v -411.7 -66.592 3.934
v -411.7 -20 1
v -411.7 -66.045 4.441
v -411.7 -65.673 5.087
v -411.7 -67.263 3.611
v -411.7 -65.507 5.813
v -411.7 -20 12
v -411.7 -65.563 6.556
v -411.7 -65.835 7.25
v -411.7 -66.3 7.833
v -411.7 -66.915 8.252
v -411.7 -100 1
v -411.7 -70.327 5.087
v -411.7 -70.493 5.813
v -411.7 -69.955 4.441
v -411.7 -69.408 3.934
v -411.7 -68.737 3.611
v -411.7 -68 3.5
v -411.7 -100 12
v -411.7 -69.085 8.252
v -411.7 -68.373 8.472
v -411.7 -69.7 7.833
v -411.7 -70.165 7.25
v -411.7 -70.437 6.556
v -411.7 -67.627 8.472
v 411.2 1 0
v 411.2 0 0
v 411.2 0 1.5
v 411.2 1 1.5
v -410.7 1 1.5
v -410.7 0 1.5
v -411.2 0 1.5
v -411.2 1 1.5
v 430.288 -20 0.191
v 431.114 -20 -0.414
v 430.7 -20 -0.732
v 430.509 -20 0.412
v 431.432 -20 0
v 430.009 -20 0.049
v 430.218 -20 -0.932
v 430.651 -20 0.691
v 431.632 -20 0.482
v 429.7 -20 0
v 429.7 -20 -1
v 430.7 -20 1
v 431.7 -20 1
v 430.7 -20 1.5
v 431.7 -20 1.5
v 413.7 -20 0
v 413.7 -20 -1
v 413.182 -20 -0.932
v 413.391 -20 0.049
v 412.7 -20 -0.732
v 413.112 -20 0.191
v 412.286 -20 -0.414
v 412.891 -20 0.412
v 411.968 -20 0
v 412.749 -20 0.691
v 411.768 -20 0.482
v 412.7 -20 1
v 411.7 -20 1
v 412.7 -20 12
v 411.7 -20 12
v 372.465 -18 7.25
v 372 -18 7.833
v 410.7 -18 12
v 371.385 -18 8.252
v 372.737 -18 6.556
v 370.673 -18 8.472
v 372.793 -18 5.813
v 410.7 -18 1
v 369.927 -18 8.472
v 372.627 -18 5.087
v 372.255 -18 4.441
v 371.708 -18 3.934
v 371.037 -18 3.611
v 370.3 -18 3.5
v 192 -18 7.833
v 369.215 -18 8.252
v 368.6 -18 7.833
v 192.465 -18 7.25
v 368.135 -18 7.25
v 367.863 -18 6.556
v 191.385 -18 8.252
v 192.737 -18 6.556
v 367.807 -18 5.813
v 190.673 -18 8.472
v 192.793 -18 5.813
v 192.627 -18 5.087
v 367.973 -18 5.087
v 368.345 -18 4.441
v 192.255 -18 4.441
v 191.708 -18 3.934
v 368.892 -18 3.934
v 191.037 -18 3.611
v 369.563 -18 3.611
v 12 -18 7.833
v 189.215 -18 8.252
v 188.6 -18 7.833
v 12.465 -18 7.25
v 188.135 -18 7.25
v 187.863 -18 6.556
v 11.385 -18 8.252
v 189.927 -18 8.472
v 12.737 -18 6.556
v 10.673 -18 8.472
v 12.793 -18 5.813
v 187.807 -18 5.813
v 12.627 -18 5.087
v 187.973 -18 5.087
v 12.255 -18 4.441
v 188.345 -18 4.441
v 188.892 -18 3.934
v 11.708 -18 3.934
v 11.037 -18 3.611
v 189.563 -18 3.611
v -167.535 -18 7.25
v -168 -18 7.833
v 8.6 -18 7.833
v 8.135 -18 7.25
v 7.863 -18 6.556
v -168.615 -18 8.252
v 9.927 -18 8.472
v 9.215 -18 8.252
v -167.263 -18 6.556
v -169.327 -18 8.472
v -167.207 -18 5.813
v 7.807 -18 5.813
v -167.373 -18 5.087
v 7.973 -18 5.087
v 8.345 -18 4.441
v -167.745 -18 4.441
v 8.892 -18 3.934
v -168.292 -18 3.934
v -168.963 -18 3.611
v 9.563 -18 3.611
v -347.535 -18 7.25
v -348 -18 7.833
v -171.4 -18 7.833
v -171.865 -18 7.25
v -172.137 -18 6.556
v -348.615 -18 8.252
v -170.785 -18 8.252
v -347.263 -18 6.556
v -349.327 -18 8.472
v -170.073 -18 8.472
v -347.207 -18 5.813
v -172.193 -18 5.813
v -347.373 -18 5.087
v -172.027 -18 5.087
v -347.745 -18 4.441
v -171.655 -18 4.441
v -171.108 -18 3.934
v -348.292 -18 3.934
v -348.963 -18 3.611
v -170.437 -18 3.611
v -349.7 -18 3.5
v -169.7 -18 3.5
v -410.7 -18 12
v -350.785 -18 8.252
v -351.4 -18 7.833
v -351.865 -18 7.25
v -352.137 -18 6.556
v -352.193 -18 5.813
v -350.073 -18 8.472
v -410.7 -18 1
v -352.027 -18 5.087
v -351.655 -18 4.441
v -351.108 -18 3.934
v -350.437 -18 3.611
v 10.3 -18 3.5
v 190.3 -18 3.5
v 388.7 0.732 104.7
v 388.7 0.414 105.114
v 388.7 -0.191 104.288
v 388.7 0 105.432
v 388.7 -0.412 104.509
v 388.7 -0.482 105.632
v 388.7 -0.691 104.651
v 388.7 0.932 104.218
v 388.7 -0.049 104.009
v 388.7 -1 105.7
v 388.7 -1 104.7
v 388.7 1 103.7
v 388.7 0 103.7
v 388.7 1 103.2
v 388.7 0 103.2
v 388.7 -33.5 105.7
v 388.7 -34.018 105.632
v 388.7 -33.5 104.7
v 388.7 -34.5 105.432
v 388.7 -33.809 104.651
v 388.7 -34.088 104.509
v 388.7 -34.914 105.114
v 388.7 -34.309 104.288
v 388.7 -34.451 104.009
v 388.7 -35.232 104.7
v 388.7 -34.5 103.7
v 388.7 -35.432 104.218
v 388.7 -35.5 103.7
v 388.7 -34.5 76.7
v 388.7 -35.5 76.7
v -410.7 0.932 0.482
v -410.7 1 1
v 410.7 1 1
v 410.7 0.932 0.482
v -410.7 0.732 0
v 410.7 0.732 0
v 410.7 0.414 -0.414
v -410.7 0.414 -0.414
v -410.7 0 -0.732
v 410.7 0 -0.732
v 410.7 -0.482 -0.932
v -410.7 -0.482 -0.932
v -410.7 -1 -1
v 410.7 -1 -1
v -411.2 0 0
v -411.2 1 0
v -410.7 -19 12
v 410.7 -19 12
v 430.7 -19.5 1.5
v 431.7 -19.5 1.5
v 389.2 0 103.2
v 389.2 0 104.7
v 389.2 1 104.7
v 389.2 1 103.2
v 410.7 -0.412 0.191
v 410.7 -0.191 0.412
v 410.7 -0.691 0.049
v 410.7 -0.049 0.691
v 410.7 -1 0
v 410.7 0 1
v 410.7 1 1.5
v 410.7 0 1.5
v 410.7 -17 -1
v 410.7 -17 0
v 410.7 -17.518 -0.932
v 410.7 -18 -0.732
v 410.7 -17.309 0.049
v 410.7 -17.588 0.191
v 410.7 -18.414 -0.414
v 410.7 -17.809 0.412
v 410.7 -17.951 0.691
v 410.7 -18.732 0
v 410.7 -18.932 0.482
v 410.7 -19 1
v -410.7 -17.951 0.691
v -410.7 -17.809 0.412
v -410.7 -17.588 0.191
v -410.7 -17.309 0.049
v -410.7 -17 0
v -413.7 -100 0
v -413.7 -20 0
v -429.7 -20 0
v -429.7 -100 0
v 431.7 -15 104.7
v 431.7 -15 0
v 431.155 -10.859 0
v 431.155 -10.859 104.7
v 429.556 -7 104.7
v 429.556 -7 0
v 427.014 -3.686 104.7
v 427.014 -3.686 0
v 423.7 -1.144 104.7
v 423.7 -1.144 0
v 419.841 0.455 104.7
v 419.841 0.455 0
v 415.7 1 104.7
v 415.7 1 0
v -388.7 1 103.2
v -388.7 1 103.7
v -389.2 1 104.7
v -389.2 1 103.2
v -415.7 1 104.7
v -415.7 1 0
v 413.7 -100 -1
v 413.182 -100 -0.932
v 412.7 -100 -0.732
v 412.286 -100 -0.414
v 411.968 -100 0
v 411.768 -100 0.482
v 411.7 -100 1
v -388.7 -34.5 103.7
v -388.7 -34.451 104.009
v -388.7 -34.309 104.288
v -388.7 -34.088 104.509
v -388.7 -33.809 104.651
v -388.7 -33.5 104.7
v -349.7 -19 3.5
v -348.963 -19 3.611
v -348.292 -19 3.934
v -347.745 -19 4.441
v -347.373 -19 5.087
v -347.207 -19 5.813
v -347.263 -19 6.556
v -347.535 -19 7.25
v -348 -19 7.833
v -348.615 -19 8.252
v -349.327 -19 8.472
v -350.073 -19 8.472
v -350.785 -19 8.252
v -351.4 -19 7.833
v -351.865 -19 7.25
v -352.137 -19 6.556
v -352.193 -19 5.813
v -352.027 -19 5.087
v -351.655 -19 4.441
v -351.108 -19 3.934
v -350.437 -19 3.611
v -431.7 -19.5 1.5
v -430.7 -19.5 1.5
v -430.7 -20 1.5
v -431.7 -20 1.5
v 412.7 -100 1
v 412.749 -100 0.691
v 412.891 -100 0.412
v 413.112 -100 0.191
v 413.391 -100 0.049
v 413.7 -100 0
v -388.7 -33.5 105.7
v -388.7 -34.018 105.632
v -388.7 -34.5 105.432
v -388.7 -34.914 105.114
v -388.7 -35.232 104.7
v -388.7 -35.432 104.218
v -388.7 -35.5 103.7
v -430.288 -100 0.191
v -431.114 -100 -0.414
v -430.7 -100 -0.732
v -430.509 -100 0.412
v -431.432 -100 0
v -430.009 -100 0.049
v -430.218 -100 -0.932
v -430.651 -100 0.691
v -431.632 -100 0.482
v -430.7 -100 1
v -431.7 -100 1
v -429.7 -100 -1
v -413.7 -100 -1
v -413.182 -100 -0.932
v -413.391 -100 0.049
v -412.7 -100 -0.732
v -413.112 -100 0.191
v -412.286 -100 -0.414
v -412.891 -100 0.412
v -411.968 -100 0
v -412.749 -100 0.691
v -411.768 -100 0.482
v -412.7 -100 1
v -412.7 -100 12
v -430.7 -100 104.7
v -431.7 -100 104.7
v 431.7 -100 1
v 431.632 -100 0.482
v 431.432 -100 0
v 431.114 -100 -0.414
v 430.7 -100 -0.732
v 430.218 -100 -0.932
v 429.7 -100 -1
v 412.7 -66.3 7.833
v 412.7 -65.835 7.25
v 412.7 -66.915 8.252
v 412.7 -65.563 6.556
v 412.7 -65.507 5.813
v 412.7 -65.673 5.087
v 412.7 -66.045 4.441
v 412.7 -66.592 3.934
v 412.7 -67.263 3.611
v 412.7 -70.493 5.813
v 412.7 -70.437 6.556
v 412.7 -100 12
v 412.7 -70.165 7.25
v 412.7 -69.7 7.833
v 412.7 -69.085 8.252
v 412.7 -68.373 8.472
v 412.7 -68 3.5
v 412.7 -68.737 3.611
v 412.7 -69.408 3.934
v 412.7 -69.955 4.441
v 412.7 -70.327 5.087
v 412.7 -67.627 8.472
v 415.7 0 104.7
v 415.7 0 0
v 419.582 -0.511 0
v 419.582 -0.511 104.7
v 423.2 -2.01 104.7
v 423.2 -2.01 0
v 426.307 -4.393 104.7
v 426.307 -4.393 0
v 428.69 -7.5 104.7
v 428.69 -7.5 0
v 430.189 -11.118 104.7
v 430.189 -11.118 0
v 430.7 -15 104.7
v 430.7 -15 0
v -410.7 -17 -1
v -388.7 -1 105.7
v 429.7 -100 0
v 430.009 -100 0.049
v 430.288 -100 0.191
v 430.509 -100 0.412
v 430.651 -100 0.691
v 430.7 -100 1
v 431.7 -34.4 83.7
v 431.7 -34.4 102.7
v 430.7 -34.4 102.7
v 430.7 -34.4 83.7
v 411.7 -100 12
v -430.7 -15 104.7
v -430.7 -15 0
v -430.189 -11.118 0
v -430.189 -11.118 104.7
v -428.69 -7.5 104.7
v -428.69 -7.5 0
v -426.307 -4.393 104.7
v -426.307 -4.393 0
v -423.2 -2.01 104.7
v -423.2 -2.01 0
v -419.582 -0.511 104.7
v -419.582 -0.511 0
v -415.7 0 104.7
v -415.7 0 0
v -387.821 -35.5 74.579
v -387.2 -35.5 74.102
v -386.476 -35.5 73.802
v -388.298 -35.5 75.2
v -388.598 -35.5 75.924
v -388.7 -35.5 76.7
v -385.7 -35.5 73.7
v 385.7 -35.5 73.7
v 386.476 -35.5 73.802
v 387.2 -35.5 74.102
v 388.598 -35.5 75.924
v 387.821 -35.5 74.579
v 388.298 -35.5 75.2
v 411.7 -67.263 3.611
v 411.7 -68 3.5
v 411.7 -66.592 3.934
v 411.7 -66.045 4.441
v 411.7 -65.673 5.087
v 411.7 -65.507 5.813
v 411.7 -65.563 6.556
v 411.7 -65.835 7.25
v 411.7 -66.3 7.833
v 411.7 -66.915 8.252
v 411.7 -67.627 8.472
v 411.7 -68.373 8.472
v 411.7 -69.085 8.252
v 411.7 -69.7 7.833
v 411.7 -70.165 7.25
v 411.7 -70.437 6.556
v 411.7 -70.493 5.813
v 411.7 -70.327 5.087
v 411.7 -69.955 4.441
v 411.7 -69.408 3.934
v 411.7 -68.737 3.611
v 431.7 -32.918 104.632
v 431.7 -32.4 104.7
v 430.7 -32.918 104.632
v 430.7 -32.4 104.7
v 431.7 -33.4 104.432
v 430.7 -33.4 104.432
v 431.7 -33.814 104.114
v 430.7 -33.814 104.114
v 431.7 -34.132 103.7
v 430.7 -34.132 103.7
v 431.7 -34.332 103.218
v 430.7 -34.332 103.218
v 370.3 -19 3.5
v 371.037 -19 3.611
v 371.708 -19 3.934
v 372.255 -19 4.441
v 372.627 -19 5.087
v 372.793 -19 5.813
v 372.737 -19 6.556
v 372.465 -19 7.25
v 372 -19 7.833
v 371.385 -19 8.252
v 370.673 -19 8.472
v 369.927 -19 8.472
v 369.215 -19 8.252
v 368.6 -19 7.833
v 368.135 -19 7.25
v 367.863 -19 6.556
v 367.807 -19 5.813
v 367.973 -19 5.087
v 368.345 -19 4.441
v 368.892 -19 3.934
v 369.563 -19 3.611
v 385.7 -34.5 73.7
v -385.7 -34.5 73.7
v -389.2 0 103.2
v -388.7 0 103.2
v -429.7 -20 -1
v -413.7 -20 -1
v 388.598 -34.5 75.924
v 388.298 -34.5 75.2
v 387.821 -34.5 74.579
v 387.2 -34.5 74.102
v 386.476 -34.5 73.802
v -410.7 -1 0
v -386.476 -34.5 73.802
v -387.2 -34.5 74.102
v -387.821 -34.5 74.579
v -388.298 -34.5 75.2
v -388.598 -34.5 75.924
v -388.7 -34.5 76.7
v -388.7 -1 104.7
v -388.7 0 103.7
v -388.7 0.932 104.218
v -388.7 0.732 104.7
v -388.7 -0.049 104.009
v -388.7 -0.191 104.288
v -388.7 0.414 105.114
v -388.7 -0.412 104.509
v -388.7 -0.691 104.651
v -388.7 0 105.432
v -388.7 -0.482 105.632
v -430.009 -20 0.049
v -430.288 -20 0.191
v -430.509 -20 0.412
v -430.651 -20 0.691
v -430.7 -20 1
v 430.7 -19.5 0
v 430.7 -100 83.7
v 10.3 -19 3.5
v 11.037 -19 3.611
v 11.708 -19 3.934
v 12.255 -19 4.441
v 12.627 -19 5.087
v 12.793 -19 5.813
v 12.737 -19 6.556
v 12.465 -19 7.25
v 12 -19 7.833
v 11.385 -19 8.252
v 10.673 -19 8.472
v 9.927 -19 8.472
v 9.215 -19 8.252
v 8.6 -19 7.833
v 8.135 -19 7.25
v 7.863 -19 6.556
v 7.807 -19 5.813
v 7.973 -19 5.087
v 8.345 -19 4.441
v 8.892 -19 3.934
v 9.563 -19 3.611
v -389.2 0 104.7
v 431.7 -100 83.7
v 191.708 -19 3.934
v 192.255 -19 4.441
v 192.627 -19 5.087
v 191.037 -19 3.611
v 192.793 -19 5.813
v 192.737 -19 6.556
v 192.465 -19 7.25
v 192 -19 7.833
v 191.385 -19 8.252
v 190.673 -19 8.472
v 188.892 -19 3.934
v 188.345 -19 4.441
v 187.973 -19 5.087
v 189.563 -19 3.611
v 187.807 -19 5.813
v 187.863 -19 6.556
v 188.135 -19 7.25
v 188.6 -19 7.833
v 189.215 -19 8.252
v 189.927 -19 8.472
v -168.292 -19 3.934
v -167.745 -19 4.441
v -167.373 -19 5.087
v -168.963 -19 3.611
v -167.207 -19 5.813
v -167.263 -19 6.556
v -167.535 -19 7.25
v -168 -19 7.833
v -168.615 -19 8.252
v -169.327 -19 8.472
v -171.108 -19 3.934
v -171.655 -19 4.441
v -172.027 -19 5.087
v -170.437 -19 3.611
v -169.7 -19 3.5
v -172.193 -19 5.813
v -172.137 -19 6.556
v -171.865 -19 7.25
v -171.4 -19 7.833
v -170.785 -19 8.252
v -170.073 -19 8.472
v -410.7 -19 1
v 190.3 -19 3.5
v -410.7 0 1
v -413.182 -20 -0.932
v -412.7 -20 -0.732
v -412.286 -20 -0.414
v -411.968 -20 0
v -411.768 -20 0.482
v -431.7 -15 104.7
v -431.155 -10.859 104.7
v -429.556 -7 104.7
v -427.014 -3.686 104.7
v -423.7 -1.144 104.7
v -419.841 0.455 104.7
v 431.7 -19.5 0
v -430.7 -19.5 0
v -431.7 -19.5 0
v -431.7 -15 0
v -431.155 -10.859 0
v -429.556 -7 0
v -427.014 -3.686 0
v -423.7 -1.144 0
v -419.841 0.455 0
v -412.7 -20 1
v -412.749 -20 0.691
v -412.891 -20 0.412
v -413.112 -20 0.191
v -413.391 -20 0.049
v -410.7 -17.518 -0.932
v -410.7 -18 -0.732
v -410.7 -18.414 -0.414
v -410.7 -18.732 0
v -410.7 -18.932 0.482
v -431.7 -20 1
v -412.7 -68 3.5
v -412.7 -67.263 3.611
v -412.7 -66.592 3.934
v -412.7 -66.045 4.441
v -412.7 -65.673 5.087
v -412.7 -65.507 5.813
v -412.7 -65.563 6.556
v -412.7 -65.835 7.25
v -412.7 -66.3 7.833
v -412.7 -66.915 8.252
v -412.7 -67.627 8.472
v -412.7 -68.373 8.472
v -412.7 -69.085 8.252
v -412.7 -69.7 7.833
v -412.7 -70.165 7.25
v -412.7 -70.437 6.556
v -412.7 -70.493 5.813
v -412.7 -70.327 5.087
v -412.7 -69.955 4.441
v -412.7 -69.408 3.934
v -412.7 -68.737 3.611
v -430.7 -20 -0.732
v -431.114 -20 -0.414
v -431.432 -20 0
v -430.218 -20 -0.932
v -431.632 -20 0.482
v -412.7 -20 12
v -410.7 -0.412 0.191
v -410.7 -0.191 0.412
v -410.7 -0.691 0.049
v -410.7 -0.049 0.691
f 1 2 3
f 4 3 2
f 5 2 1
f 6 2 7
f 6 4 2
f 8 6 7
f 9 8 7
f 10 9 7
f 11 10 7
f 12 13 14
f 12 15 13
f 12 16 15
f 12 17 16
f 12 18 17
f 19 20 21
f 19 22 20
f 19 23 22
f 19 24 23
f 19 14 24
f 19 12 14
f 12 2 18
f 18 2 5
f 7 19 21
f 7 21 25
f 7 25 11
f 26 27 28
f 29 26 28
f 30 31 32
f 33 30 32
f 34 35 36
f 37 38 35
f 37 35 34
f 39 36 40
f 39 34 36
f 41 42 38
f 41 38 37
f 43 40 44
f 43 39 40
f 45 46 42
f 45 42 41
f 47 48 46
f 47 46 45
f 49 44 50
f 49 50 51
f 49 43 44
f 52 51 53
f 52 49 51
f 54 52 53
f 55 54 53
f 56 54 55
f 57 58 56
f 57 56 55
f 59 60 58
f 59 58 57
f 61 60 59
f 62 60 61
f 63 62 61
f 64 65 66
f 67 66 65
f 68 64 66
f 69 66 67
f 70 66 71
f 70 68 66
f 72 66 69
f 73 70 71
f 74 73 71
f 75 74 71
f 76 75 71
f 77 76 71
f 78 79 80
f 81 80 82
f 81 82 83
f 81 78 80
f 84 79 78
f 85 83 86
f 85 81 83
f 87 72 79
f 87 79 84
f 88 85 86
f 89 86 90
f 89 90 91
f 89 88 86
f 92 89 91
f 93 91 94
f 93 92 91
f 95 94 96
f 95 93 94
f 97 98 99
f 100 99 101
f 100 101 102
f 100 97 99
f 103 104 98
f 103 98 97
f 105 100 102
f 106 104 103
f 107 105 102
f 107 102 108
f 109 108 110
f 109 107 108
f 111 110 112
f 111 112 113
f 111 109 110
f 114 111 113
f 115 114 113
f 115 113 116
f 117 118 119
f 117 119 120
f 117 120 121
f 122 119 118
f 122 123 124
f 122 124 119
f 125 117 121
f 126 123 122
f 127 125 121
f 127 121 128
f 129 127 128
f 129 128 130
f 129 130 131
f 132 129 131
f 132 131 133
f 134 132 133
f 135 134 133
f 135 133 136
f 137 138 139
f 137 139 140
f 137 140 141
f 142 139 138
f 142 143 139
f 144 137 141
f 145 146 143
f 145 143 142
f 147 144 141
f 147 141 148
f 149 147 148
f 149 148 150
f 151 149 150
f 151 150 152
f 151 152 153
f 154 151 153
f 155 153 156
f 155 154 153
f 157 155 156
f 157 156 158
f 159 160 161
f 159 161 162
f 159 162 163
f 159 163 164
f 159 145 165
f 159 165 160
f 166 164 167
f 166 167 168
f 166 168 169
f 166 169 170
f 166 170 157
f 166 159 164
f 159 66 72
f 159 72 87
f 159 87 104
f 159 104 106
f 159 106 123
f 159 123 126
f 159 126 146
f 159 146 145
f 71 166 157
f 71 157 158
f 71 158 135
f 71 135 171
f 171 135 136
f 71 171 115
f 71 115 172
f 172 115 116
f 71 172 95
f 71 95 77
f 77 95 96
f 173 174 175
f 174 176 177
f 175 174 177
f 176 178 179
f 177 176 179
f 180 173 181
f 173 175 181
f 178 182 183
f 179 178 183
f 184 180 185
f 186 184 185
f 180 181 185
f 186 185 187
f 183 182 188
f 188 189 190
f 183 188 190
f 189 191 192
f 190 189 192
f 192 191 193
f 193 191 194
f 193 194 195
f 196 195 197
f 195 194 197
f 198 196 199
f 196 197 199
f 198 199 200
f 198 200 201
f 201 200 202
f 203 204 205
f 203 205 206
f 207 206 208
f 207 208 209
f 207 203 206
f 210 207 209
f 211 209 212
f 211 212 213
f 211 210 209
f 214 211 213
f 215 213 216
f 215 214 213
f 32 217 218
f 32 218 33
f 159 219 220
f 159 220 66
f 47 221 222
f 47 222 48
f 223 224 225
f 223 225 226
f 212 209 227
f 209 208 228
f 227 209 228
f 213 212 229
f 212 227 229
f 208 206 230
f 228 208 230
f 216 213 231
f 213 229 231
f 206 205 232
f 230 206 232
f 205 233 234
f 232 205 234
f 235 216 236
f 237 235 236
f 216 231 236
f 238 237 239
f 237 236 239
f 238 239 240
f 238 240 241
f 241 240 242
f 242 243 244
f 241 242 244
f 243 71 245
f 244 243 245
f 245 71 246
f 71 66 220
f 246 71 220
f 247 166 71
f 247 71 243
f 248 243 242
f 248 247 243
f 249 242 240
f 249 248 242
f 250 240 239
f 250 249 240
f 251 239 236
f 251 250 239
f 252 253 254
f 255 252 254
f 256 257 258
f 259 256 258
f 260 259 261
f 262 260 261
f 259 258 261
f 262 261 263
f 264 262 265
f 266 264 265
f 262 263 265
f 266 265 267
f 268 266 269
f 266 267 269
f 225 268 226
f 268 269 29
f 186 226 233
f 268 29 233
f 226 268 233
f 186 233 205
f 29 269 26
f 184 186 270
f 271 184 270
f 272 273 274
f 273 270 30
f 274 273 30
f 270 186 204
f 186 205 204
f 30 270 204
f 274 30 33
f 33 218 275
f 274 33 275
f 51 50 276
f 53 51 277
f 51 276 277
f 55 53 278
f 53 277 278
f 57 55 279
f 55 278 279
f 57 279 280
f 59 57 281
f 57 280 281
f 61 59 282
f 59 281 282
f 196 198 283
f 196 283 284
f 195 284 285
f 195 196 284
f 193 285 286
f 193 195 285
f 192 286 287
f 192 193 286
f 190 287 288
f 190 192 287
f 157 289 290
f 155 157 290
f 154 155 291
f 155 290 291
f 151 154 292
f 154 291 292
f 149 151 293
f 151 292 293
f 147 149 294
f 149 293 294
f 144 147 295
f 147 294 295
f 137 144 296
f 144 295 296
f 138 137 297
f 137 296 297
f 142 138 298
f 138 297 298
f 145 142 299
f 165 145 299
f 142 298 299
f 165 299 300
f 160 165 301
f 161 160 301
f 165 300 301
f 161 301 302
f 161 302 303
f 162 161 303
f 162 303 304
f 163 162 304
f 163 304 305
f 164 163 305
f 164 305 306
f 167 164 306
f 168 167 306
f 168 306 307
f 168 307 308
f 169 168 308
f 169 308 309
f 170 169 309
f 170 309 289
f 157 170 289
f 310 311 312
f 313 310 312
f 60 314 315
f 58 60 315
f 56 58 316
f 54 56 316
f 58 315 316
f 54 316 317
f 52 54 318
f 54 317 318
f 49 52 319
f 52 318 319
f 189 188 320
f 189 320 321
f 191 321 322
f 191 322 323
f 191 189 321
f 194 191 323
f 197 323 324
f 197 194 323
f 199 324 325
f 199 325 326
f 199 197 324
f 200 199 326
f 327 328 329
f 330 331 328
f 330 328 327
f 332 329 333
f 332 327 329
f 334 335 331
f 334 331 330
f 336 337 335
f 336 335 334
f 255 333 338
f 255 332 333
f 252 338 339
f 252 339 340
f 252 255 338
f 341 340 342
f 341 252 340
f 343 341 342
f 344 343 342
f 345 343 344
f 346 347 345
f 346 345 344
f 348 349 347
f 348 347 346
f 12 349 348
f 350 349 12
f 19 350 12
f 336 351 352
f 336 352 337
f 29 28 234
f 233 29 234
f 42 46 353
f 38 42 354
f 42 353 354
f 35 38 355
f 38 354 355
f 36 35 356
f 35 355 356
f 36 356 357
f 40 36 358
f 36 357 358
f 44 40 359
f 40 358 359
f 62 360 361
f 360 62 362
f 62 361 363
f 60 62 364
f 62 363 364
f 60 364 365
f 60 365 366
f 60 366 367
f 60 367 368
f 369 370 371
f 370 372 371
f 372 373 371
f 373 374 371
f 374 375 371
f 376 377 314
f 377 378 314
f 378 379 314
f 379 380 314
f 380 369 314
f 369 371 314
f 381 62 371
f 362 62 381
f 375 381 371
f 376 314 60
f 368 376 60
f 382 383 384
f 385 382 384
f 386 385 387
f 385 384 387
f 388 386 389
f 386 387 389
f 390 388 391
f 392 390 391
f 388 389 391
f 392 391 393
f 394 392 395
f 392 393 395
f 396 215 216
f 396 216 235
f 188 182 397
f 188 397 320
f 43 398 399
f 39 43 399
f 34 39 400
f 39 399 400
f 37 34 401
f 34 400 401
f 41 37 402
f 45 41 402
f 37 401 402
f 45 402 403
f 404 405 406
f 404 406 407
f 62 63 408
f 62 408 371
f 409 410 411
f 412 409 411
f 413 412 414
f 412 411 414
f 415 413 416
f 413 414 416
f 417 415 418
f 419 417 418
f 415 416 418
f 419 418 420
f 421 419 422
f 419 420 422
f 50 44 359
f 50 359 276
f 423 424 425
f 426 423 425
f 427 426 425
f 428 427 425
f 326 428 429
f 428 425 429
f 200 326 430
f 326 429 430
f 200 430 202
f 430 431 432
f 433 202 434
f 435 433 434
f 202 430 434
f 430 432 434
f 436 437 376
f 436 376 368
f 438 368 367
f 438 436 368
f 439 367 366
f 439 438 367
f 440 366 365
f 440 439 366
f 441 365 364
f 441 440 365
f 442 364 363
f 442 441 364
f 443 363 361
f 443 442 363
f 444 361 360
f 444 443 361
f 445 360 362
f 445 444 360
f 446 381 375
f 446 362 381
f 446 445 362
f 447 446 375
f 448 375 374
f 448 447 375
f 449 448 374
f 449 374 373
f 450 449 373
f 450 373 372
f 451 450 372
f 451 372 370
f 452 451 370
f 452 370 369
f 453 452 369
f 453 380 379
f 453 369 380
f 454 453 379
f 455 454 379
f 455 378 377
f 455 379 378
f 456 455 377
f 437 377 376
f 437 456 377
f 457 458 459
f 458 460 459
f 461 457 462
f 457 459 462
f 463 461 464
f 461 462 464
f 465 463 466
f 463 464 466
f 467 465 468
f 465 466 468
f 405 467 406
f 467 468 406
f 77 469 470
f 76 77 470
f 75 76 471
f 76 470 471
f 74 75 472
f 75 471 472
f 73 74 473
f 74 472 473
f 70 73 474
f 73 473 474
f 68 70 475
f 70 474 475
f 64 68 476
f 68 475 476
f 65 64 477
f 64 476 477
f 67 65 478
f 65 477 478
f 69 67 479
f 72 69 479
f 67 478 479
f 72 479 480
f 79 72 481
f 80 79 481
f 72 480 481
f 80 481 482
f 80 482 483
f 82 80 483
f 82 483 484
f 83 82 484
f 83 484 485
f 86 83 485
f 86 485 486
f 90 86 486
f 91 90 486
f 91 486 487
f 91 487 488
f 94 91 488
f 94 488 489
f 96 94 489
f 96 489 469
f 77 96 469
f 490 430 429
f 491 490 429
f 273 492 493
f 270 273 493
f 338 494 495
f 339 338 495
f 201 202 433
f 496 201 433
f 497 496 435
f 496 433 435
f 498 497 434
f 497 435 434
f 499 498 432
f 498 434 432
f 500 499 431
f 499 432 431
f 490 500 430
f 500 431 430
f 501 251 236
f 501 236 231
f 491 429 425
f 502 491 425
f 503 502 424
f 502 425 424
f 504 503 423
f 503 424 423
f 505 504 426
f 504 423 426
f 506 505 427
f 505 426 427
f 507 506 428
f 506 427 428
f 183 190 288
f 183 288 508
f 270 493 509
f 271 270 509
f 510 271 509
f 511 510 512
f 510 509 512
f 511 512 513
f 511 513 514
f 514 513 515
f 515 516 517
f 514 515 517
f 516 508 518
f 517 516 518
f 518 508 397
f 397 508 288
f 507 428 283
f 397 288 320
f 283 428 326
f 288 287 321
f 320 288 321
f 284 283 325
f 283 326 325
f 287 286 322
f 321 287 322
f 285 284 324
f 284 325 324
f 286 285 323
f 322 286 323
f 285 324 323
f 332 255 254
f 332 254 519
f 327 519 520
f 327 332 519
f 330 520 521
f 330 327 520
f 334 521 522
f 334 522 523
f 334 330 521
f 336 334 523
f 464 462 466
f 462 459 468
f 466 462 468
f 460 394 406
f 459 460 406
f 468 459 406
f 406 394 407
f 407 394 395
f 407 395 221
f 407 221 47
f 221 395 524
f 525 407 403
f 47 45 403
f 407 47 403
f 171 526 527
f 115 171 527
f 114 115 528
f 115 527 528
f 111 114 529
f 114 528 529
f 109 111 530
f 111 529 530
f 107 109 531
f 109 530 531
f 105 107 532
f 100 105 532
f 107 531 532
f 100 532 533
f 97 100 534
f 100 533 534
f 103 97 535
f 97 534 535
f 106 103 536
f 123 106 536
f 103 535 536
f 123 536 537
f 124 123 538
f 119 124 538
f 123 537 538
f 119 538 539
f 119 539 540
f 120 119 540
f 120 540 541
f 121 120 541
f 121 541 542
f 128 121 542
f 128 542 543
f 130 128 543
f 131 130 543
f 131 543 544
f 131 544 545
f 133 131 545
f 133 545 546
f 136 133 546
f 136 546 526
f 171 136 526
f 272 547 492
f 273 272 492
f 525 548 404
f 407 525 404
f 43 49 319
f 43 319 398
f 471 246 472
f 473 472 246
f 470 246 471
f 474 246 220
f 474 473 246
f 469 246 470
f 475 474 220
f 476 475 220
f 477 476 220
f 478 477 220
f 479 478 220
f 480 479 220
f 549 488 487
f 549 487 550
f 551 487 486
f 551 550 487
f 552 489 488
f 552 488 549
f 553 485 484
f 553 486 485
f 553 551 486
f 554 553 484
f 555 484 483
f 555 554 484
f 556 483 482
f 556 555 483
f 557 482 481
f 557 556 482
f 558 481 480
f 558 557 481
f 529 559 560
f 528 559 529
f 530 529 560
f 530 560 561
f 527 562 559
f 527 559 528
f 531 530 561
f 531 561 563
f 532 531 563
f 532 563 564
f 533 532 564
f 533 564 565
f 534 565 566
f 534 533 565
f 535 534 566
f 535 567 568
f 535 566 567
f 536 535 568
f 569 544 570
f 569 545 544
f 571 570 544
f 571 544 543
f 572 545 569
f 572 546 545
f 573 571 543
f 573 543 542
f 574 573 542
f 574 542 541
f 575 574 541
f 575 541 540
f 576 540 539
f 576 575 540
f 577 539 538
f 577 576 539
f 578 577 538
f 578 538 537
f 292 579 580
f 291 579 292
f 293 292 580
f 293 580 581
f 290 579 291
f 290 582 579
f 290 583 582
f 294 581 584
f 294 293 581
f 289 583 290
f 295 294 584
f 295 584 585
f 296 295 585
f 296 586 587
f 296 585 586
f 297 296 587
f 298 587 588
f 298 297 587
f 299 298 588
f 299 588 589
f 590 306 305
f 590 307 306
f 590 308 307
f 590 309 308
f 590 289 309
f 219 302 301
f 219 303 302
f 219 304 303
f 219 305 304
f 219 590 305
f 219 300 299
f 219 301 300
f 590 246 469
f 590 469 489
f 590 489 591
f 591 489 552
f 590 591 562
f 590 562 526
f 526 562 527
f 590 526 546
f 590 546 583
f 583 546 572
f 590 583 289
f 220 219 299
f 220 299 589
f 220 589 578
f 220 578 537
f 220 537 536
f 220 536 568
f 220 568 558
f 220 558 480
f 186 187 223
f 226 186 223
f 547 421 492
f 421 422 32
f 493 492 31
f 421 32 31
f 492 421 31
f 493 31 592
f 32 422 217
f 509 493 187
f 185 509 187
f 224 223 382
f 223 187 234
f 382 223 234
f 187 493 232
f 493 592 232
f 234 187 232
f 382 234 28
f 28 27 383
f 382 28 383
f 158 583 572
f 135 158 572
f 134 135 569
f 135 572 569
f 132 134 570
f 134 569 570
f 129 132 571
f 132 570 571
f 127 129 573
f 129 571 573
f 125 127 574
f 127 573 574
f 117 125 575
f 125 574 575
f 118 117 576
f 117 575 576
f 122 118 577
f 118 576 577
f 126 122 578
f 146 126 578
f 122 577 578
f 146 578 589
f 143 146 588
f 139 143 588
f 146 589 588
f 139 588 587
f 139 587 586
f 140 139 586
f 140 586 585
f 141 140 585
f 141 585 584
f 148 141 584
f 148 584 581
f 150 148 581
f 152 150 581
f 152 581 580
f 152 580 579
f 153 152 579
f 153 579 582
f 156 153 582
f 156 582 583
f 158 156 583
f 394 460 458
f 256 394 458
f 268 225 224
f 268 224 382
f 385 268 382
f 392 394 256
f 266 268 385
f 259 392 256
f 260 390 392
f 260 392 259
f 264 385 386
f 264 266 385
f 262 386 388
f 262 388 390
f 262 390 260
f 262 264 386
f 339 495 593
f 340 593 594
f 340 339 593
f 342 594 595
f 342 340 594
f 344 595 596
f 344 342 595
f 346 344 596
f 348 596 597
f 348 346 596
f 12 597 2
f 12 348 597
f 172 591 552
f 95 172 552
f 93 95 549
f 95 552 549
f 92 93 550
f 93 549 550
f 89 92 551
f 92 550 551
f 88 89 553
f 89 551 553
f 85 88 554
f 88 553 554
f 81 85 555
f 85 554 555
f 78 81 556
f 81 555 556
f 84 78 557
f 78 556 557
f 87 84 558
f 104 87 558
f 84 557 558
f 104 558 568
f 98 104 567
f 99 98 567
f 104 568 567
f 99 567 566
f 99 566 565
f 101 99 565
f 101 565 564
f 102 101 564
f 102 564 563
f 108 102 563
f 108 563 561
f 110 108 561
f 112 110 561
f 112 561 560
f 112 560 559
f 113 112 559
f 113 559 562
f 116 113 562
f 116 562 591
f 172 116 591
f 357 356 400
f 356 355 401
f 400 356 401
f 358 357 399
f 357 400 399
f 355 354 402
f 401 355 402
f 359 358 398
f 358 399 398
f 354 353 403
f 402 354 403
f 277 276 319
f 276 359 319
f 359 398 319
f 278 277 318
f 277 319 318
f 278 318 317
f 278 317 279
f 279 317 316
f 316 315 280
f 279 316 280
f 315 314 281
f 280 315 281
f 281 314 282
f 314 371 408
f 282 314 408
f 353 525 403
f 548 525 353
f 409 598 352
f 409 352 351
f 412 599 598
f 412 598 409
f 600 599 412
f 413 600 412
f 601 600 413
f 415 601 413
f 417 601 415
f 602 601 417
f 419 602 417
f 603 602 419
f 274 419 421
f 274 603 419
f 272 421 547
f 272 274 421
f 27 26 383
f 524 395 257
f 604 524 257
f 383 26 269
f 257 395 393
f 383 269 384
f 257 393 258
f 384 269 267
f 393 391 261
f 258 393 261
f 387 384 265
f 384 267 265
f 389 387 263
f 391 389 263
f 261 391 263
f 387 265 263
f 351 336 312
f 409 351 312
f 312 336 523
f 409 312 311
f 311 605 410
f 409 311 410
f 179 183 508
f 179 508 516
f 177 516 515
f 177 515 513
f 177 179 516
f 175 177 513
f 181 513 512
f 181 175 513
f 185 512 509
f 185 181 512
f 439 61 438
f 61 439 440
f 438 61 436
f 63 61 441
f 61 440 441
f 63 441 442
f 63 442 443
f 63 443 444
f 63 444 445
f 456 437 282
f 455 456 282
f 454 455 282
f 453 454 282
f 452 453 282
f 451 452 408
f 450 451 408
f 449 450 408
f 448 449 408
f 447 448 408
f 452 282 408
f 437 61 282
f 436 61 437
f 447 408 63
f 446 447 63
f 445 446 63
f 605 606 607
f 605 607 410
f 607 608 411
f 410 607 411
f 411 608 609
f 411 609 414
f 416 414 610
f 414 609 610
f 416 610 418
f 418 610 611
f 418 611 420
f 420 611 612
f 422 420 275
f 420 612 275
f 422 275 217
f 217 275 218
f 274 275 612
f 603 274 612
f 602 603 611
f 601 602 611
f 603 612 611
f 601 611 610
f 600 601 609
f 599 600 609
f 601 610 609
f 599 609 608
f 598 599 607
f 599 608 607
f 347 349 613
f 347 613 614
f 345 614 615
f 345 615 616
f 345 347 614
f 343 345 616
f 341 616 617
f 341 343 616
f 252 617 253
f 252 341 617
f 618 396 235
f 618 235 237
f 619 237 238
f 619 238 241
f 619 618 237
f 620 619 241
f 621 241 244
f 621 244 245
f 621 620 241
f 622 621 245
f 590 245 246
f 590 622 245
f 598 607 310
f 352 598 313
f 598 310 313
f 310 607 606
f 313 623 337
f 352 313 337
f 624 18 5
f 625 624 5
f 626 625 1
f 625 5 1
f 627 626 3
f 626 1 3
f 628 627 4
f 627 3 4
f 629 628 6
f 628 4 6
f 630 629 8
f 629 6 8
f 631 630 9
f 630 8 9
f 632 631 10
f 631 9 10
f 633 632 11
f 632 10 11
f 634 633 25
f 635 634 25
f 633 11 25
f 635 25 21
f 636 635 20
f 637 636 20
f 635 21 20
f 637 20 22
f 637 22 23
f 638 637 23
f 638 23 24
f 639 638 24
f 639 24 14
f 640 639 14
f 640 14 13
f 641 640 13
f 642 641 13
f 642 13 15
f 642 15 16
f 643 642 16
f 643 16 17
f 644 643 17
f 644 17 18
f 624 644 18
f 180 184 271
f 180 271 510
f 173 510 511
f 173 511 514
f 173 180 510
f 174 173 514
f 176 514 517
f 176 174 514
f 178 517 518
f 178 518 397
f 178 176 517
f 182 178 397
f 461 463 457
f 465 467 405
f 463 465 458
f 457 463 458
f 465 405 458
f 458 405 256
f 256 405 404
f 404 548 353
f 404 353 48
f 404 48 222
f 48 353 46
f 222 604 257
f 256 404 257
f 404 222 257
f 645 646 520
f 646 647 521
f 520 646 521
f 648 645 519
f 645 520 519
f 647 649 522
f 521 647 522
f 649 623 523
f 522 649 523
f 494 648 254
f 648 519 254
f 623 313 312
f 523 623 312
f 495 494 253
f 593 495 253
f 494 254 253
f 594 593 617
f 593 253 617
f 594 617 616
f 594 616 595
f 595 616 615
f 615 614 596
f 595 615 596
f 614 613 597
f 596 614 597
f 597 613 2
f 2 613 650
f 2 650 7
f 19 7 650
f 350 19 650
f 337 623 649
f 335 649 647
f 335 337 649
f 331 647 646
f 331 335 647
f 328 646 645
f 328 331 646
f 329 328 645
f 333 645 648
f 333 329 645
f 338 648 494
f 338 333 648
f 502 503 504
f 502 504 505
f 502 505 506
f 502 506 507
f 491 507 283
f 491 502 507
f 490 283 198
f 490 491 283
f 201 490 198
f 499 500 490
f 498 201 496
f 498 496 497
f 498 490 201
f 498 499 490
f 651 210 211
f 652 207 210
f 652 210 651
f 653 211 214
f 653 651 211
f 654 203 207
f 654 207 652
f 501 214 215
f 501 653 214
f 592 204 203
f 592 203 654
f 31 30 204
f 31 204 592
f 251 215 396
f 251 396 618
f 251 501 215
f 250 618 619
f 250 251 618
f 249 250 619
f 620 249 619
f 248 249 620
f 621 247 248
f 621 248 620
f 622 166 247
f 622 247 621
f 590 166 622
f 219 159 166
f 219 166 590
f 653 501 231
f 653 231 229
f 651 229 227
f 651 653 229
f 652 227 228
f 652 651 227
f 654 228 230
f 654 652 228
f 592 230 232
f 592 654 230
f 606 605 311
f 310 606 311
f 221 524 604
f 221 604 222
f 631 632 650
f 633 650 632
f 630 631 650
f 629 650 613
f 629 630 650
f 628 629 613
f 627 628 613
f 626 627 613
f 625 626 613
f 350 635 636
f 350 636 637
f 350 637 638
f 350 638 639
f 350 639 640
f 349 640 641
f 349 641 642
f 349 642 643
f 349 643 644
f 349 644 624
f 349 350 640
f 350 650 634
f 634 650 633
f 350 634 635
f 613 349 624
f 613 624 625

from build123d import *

# Parameters (mm, degrees)
BASE_FLANGE1_DEPTH             = 104.7
EDGE_FLANGE1_STRIP_W           = 6
EDGE_FLANGE1_STRIP_H           = 1
EDGE_FLANGE1_STRIP_CUT_DEPTH   = 821.4
EDGE_FLANGE1_RELIEF_W          = 6.5
EDGE_FLANGE1_RELIEF_H          = 0.5
EDGE_FLANGE1_RELIEF_CUT_DEPTH  = 1
EDGE_FLANGE1_DEPTH             = 821.4
EDGE_FLANGE2_STRIP_W           = 6
EDGE_FLANGE2_STRIP_H           = 1
EDGE_FLANGE2_STRIP_CUT_DEPTH   = 821.4
EDGE_FLANGE2_DEPTH             = 821.4
EDGE_FLANGE3_STRIP_W           = 6
EDGE_FLANGE3_STRIP_H           = 1
EDGE_FLANGE3_STRIP_CUT_DEPTH   = 80
EDGE_FLANGE3_RELIEF_W          = 6.5
EDGE_FLANGE3_RELIEF_H          = 0.5
EDGE_FLANGE3_RELIEF_CUT_DEPTH  = 1
EDGE_FLANGE3_DEPTH             = 80
EDGE_FLANGE4_STRIP_W           = 6
EDGE_FLANGE4_STRIP_H           = 1
EDGE_FLANGE4_STRIP_CUT_DEPTH   = 80
EDGE_FLANGE4_DEPTH             = 80
EDGE_FLANGE5_STRIP_W           = 6
EDGE_FLANGE5_STRIP_H           = 1
EDGE_FLANGE5_STRIP_CUT_DEPTH   = 777.4
EDGE_FLANGE5_RELIEF_W          = 6.5
EDGE_FLANGE5_RELIEF_H          = 0.5
EDGE_FLANGE5_RELIEF_CUT_DEPTH  = 1
EDGE_FLANGE5_DEPTH             = 777.4
SKETCH25_R                     = 2.5
CUT_EXTRUDE1_DEPTH             = 3
SKETCH26_R                     = 2.5
CUT_EXTRUDE2_DEPTH             = 3
CUT_EXTRUDE2_DIRECTION_2_REACH = 857.86
EDGE_FLANGE7_STRIP_W           = 6
EDGE_FLANGE7_STRIP_H           = 1
EDGE_FLANGE7_STRIP_CUT_DEPTH   = 777.4
EDGE_FLANGE7_DEPTH             = 777.4
EDGE_FLANGE7_FLAT_DEPTH        = 1
SKETCH30_W                     = 21
SKETCH30_H                     = 65.6
CUT_EXTRUDE3_DEPTH             = 10
FILLET1_R                      = 2


# Sheet-metal steps are written as plain solids
with BuildPart() as part:
    # Sketch1 → Base-Flange1 (new body)
    with BuildSketch(Plane.XY):
        with BuildLine():
            Line((-430.7, -100), (-430.7, -15))
            ThreePointArc((-430.7, -15), (-426.306601718, -4.393398282), (-415.7, 0))
            Line((-415.7, 0), (415.7, 0))
            ThreePointArc((415.7, 0), (426.306601718, -4.393398282), (430.7, -15))
            Line((430.7, -15), (430.7, -100))
            Line((430.7, -100), (431.7, -100))
            Line((431.7, -100), (431.7, -15))
            ThreePointArc((431.7, -15), (427.013708499, -3.686291501), (415.7, 1))
            Line((415.7, 1), (-415.7, 1))
            ThreePointArc((-415.7, 1), (-427.013708499, -3.686291501), (-431.7, -15))
            Line((-431.7, -15), (-431.7, -100))
            Line((-431.7, -100), (-430.7, -100))
        make_face()
    extrude(amount=BASE_FLANGE1_DEPTH)

    # Edge-Flange1 strip (across the edge) → Edge-Flange1 strip cut (cut)
    with BuildSketch(Plane(origin=(-410.7, 0, 0), x_dir=(0, 0, 1), z_dir=(1, 0, 0))):
        with Locations((-2, -0.5)):
            Rectangle(EDGE_FLANGE1_STRIP_W, EDGE_FLANGE1_STRIP_H)
    extrude(amount=EDGE_FLANGE1_STRIP_CUT_DEPTH, mode=Mode.SUBTRACT)

    # Edge-Flange1 relief (on the sheet) → Edge-Flange1 relief cut (cut)
    with BuildSketch(Plane(origin=(-410.7, 0, 1), x_dir=(0, 0, 1), z_dir=(0, -1, 0))):
        with Locations((-2.75, 0.25)):
            Rectangle(EDGE_FLANGE1_RELIEF_W, EDGE_FLANGE1_RELIEF_H)
        with Locations((-2.75, -821.65)):
            Rectangle(EDGE_FLANGE1_RELIEF_W, EDGE_FLANGE1_RELIEF_H)
    extrude(amount=-EDGE_FLANGE1_RELIEF_CUT_DEPTH, mode=Mode.SUBTRACT)

    # Edge-Flange1 section (across the edge) → Edge-Flange1 (add)
    with BuildSketch(Plane(origin=(-410.7, 0, 0), x_dir=(0, 0, 1), z_dir=(1, 0, 0))):
        with BuildLine():
            Line((-1, 1), (-1, 19))
            Line((-1, 19), (0, 19))
            Line((0, 19), (0, 1))
            ThreePointArc((0, 1), (0.292893219, 0.292893219), (1, 0))
            Line((1, 0), (1, -1))
            ThreePointArc((1, -1), (-0.414213562, -0.414213562), (-1, 1))
        make_face()
    extrude(amount=EDGE_FLANGE1_DEPTH)

    # Edge-Flange2 strip (across the edge) → Edge-Flange2 strip cut (cut)
    with BuildSketch(Plane(origin=(-410.7, -19, 0), x_dir=(0, 1, 0), z_dir=(1, 0, 0))):
        with Locations((-1, -0.5)):
            Rectangle(EDGE_FLANGE2_STRIP_W, EDGE_FLANGE2_STRIP_H)
    extrude(amount=EDGE_FLANGE2_STRIP_CUT_DEPTH, mode=Mode.SUBTRACT)

    # Edge-Flange2 section (across the edge) → Edge-Flange2 (add)
    with BuildSketch(Plane(origin=(-410.7, -19, 0), x_dir=(0, 1, 0), z_dir=(1, 0, 0))):
        with BuildLine():
            Line((0, 1), (0, 12))
            Line((0, 12), (1, 12))
            Line((1, 12), (1, 1))
            ThreePointArc((1, 1), (1.292893219, 0.292893219), (2, 0))
            Line((2, 0), (2, -1))
            ThreePointArc((2, -1), (0.585786438, -0.414213562), (0, 1))
        make_face()
    extrude(amount=EDGE_FLANGE2_DEPTH)

    # Edge-Flange3 strip (across the edge) → Edge-Flange3 strip cut (cut)
    with BuildSketch(Plane(origin=(-430.7, -100, 0), x_dir=(0, 0, 1), z_dir=(0, 1, 0))):
        with Locations((-2, -0.5)):
            Rectangle(EDGE_FLANGE3_STRIP_W, EDGE_FLANGE3_STRIP_H)
    edge_flange3_strip_cut = extrude(amount=EDGE_FLANGE3_STRIP_CUT_DEPTH, mode=Mode.SUBTRACT)

    # Edge-Flange3 relief (on the sheet) → Edge-Flange3 relief cut (cut)
    with BuildSketch(Plane(origin=(-430.7, -100, 1), x_dir=(0, 0, 1), z_dir=(1, 0, 0))):
        with Locations((-2.75, -80.25)):
            Rectangle(EDGE_FLANGE3_RELIEF_W, EDGE_FLANGE3_RELIEF_H)
    edge_flange3_relief_cut = extrude(amount=-EDGE_FLANGE3_RELIEF_CUT_DEPTH, mode=Mode.SUBTRACT)

    # Edge-Flange3 section (across the edge) → Edge-Flange3 (add)
    with BuildSketch(Plane(origin=(-430.7, -100, 0), x_dir=(0, 0, 1), z_dir=(0, 1, 0))):
        with BuildLine():
            Line((-1, 1), (-1, 19))
            Line((-1, 19), (0, 19))
            Line((0, 19), (0, 1))
            ThreePointArc((0, 1), (0.292893219, 0.292893219), (1, 0))
            Line((1, 0), (1, -1))
            ThreePointArc((1, -1), (-0.414213562, -0.414213562), (-1, 1))
        make_face()
    edge_flange3 = extrude(amount=EDGE_FLANGE3_DEPTH)

    # Edge-Flange4 strip (across the edge) → Edge-Flange4 strip cut (cut)
    with BuildSketch(Plane(origin=(-411.7, -100, 0), x_dir=(-1, 0, 0), z_dir=(0, 1, 0))):
        with Locations((-1, -0.5)):
            Rectangle(EDGE_FLANGE4_STRIP_W, EDGE_FLANGE4_STRIP_H)
    edge_flange4_strip_cut = extrude(amount=EDGE_FLANGE4_STRIP_CUT_DEPTH, mode=Mode.SUBTRACT)

    # Edge-Flange4 section (across the edge) → Edge-Flange4 (add)
    with BuildSketch(Plane(origin=(-411.7, -100, 0), x_dir=(-1, 0, 0), z_dir=(0, 1, 0))):
        with BuildLine():
            Line((0, 1), (0, 12))
            Line((0, 12), (1, 12))
            Line((1, 12), (1, 1))
            ThreePointArc((1, 1), (1.292893219, 0.292893219), (2, 0))
            Line((2, 0), (2, -1))
            ThreePointArc((2, -1), (0.585786438, -0.414213562), (0, 1))
        make_face()
    edge_flange4 = extrude(amount=EDGE_FLANGE4_DEPTH)

    # Mirror1: Edge-Flange3 strip cut, Edge-Flange3 relief cut, Edge-Flange3, Edge-Flange4 strip cut, Edge-Flange4 across plane
    add(edge_flange3_strip_cut.mirror(Plane(origin=(0, 0, 0), x_dir=(0, 0, 1), z_dir=(1, 0, 0))), mode=Mode.SUBTRACT)
    add(edge_flange3_relief_cut.mirror(Plane(origin=(0, 0, 0), x_dir=(0, 0, 1), z_dir=(1, 0, 0))), mode=Mode.SUBTRACT)
    add(edge_flange3.mirror(Plane(origin=(0, 0, 0), x_dir=(0, 0, 1), z_dir=(1, 0, 0))))
    add(edge_flange4_strip_cut.mirror(Plane(origin=(0, 0, 0), x_dir=(0, 0, 1), z_dir=(1, 0, 0))), mode=Mode.SUBTRACT)
    add(edge_flange4.mirror(Plane(origin=(0, 0, 0), x_dir=(0, 0, 1), z_dir=(1, 0, 0))))

    # Edge-Flange5 strip (across the edge) → Edge-Flange5 strip cut (cut)
    with BuildSketch(Plane(origin=(388.7, 0, 104.7), x_dir=(0, 0, -1), z_dir=(-1, 0, 0))):
        with Locations((-2, -0.5)):
            Rectangle(EDGE_FLANGE5_STRIP_W, EDGE_FLANGE5_STRIP_H)
    extrude(amount=EDGE_FLANGE5_STRIP_CUT_DEPTH, mode=Mode.SUBTRACT)

    # Edge-Flange5 relief (on the sheet) → Edge-Flange5 relief cut (cut)
    with BuildSketch(Plane(origin=(388.7, 0, 103.7), x_dir=(0, 0, -1), z_dir=(0, -1, 0))):
        with Locations((-2.75, 0.25)):
            Rectangle(EDGE_FLANGE5_RELIEF_W, EDGE_FLANGE5_RELIEF_H)
        with Locations((-2.75, -777.65)):
            Rectangle(EDGE_FLANGE5_RELIEF_W, EDGE_FLANGE5_RELIEF_H)
    extrude(amount=-EDGE_FLANGE5_RELIEF_CUT_DEPTH, mode=Mode.SUBTRACT)

    # Edge-Flange5 section (across the edge) → Edge-Flange5 (add)
    with BuildSketch(Plane(origin=(388.7, 0, 104.7), x_dir=(0, 0, -1), z_dir=(-1, 0, 0))):
        with BuildLine():
            Line((-1, 1), (-1, 35.5))
            Line((-1, 35.5), (0, 35.5))
            Line((0, 35.5), (0, 1))
            ThreePointArc((0, 1), (0.292893219, 0.292893219), (1, 0))
            Line((1, 0), (1, -1))
            ThreePointArc((1, -1), (-0.414213562, -0.414213562), (-1, 1))
        make_face()
    extrude(amount=EDGE_FLANGE5_DEPTH)

    # Sketch25 → Cut-Extrude1 (cut)
    with BuildSketch(Plane.XZ.offset(19)):
        with Locations(Location((-349.7, 6, 0), (0, 0, 270))):
            Circle(SKETCH25_R)
        with Locations(Location((-169.7, 6, 0), (0, 0, 270))):
            Circle(SKETCH25_R)
        with Locations(Location((10.3, 6, 0), (0, 0, 270))):
            Circle(SKETCH25_R)
        with Locations(Location((190.3, 6, 0), (0, 0, 270))):
            Circle(SKETCH25_R)
        with Locations(Location((370.3, 6, 0), (0, 0, 270))):
            Circle(SKETCH25_R)
        with Locations((550.3, 6)):
            Circle(SKETCH25_R)
        with Locations((730.3, 6)):
            Circle(SKETCH25_R)
    extrude(amount=-CUT_EXTRUDE1_DEPTH, mode=Mode.SUBTRACT)

    # Sketch26 → Cut-Extrude2 (cut)
    with BuildSketch(Plane(origin=(-411.7, 0, 0), x_dir=(0, 0, -1), z_dir=(1, 0, 0))):
        with Locations((-6, -68)):
            Circle(SKETCH26_R)
    extrude(amount=-CUT_EXTRUDE2_DEPTH, mode=Mode.SUBTRACT)

    # Cut-Extrude2 direction 2: up to this face of the body (flat: up to its plane)
    cut_extrude2_direction_2_end = Plane(part.part.faces().sort_by_distance((412.7, -60, 6.5))[0])
    # Sketch26 → Cut-Extrude2 direction 2 (cut, up to the picked face)
    with BuildSketch(Plane(origin=(-411.7, 0, 0), x_dir=(0, 0, -1), z_dir=(1, 0, 0)), mode=Mode.PRIVATE) as cut_extrude2_direction_2_sk1:
        with Locations((-6, -68)):
            Circle(SKETCH26_R)
    cut_extrude2_direction_2_tool1 = split(extrude(cut_extrude2_direction_2_sk1.sketch, amount=CUT_EXTRUDE2_DIRECTION_2_REACH, mode=Mode.PRIVATE), bisect_by=cut_extrude2_direction_2_end, keep=Keep.BOTH, mode=Mode.PRIVATE)
    add(cut_extrude2_direction_2_tool1.solids().sort_by(Axis((-411.7, -68, 6), (1, 0, 0)))[0], mode=Mode.SUBTRACT)

    # Edge-Flange7 strip (across the edge) → Edge-Flange7 strip cut (cut)
    with BuildSketch(Plane(origin=(388.7, -35.5, 104.7), x_dir=(0, 1, 0), z_dir=(-1, 0, 0))):
        with Locations((-1, -0.5)):
            Rectangle(EDGE_FLANGE7_STRIP_W, EDGE_FLANGE7_STRIP_H)
    extrude(amount=EDGE_FLANGE7_STRIP_CUT_DEPTH, mode=Mode.SUBTRACT)

    # Edge-Flange7 bend section (across the edge) → Edge-Flange7 (add)
    with BuildSketch(Plane(origin=(388.7, -35.5, 104.7), x_dir=(0, 1, 0), z_dir=(-1, 0, 0))):
        with BuildLine():
            Line((0, 1), (1, 1))
            ThreePointArc((1, 1), (1.292893219, 0.292893219), (2, 0))
            Line((2, 0), (2, -1))
            ThreePointArc((2, -1), (0.585786438, -0.414213562), (0, 1))
        make_face()
    extrude(amount=EDGE_FLANGE7_DEPTH)

    # Edge-Flange7 profile (on flange) → Edge-Flange7 flat (add)
    with BuildSketch(Plane(origin=(0, -35.5, 104.7), x_dir=(1, 0, 0), z_dir=(0, 1, 0))):
        with BuildLine():
            Line((-388.7, 1), (388.7, 1))
            Line((388.7, 1), (388.7, 28))
            ThreePointArc((388.7, 28), (387.821320344, 30.121320344), (385.7, 31))
            Line((385.7, 31), (-385.7, 31))
            ThreePointArc((-385.7, 31), (-387.821320344, 30.121320344), (-388.7, 28))
            Line((-388.7, 28), (-388.7, 1))
        make_face()
    extrude(amount=EDGE_FLANGE7_FLAT_DEPTH)

    # Sketch30 → Cut-Extrude3 (cut)
    with BuildSketch(Plane(origin=(431.7, 0, 0), x_dir=(0, 0, -1), z_dir=(1, 0, 0))):
        with Locations((-94.2, -67.2)):
            Rectangle(SKETCH30_W, SKETCH30_H)
    extrude(amount=-CUT_EXTRUDE3_DEPTH, mode=Mode.SUBTRACT)

    # Fillet1
    fillet1_edges = [part.edges().sort_by_distance(p)[0] for p in [
        (431.2, -34.4, 104.7),
    ]]
    fillet(fillet1_edges, radius=FILLET1_R)


solid = part.part
